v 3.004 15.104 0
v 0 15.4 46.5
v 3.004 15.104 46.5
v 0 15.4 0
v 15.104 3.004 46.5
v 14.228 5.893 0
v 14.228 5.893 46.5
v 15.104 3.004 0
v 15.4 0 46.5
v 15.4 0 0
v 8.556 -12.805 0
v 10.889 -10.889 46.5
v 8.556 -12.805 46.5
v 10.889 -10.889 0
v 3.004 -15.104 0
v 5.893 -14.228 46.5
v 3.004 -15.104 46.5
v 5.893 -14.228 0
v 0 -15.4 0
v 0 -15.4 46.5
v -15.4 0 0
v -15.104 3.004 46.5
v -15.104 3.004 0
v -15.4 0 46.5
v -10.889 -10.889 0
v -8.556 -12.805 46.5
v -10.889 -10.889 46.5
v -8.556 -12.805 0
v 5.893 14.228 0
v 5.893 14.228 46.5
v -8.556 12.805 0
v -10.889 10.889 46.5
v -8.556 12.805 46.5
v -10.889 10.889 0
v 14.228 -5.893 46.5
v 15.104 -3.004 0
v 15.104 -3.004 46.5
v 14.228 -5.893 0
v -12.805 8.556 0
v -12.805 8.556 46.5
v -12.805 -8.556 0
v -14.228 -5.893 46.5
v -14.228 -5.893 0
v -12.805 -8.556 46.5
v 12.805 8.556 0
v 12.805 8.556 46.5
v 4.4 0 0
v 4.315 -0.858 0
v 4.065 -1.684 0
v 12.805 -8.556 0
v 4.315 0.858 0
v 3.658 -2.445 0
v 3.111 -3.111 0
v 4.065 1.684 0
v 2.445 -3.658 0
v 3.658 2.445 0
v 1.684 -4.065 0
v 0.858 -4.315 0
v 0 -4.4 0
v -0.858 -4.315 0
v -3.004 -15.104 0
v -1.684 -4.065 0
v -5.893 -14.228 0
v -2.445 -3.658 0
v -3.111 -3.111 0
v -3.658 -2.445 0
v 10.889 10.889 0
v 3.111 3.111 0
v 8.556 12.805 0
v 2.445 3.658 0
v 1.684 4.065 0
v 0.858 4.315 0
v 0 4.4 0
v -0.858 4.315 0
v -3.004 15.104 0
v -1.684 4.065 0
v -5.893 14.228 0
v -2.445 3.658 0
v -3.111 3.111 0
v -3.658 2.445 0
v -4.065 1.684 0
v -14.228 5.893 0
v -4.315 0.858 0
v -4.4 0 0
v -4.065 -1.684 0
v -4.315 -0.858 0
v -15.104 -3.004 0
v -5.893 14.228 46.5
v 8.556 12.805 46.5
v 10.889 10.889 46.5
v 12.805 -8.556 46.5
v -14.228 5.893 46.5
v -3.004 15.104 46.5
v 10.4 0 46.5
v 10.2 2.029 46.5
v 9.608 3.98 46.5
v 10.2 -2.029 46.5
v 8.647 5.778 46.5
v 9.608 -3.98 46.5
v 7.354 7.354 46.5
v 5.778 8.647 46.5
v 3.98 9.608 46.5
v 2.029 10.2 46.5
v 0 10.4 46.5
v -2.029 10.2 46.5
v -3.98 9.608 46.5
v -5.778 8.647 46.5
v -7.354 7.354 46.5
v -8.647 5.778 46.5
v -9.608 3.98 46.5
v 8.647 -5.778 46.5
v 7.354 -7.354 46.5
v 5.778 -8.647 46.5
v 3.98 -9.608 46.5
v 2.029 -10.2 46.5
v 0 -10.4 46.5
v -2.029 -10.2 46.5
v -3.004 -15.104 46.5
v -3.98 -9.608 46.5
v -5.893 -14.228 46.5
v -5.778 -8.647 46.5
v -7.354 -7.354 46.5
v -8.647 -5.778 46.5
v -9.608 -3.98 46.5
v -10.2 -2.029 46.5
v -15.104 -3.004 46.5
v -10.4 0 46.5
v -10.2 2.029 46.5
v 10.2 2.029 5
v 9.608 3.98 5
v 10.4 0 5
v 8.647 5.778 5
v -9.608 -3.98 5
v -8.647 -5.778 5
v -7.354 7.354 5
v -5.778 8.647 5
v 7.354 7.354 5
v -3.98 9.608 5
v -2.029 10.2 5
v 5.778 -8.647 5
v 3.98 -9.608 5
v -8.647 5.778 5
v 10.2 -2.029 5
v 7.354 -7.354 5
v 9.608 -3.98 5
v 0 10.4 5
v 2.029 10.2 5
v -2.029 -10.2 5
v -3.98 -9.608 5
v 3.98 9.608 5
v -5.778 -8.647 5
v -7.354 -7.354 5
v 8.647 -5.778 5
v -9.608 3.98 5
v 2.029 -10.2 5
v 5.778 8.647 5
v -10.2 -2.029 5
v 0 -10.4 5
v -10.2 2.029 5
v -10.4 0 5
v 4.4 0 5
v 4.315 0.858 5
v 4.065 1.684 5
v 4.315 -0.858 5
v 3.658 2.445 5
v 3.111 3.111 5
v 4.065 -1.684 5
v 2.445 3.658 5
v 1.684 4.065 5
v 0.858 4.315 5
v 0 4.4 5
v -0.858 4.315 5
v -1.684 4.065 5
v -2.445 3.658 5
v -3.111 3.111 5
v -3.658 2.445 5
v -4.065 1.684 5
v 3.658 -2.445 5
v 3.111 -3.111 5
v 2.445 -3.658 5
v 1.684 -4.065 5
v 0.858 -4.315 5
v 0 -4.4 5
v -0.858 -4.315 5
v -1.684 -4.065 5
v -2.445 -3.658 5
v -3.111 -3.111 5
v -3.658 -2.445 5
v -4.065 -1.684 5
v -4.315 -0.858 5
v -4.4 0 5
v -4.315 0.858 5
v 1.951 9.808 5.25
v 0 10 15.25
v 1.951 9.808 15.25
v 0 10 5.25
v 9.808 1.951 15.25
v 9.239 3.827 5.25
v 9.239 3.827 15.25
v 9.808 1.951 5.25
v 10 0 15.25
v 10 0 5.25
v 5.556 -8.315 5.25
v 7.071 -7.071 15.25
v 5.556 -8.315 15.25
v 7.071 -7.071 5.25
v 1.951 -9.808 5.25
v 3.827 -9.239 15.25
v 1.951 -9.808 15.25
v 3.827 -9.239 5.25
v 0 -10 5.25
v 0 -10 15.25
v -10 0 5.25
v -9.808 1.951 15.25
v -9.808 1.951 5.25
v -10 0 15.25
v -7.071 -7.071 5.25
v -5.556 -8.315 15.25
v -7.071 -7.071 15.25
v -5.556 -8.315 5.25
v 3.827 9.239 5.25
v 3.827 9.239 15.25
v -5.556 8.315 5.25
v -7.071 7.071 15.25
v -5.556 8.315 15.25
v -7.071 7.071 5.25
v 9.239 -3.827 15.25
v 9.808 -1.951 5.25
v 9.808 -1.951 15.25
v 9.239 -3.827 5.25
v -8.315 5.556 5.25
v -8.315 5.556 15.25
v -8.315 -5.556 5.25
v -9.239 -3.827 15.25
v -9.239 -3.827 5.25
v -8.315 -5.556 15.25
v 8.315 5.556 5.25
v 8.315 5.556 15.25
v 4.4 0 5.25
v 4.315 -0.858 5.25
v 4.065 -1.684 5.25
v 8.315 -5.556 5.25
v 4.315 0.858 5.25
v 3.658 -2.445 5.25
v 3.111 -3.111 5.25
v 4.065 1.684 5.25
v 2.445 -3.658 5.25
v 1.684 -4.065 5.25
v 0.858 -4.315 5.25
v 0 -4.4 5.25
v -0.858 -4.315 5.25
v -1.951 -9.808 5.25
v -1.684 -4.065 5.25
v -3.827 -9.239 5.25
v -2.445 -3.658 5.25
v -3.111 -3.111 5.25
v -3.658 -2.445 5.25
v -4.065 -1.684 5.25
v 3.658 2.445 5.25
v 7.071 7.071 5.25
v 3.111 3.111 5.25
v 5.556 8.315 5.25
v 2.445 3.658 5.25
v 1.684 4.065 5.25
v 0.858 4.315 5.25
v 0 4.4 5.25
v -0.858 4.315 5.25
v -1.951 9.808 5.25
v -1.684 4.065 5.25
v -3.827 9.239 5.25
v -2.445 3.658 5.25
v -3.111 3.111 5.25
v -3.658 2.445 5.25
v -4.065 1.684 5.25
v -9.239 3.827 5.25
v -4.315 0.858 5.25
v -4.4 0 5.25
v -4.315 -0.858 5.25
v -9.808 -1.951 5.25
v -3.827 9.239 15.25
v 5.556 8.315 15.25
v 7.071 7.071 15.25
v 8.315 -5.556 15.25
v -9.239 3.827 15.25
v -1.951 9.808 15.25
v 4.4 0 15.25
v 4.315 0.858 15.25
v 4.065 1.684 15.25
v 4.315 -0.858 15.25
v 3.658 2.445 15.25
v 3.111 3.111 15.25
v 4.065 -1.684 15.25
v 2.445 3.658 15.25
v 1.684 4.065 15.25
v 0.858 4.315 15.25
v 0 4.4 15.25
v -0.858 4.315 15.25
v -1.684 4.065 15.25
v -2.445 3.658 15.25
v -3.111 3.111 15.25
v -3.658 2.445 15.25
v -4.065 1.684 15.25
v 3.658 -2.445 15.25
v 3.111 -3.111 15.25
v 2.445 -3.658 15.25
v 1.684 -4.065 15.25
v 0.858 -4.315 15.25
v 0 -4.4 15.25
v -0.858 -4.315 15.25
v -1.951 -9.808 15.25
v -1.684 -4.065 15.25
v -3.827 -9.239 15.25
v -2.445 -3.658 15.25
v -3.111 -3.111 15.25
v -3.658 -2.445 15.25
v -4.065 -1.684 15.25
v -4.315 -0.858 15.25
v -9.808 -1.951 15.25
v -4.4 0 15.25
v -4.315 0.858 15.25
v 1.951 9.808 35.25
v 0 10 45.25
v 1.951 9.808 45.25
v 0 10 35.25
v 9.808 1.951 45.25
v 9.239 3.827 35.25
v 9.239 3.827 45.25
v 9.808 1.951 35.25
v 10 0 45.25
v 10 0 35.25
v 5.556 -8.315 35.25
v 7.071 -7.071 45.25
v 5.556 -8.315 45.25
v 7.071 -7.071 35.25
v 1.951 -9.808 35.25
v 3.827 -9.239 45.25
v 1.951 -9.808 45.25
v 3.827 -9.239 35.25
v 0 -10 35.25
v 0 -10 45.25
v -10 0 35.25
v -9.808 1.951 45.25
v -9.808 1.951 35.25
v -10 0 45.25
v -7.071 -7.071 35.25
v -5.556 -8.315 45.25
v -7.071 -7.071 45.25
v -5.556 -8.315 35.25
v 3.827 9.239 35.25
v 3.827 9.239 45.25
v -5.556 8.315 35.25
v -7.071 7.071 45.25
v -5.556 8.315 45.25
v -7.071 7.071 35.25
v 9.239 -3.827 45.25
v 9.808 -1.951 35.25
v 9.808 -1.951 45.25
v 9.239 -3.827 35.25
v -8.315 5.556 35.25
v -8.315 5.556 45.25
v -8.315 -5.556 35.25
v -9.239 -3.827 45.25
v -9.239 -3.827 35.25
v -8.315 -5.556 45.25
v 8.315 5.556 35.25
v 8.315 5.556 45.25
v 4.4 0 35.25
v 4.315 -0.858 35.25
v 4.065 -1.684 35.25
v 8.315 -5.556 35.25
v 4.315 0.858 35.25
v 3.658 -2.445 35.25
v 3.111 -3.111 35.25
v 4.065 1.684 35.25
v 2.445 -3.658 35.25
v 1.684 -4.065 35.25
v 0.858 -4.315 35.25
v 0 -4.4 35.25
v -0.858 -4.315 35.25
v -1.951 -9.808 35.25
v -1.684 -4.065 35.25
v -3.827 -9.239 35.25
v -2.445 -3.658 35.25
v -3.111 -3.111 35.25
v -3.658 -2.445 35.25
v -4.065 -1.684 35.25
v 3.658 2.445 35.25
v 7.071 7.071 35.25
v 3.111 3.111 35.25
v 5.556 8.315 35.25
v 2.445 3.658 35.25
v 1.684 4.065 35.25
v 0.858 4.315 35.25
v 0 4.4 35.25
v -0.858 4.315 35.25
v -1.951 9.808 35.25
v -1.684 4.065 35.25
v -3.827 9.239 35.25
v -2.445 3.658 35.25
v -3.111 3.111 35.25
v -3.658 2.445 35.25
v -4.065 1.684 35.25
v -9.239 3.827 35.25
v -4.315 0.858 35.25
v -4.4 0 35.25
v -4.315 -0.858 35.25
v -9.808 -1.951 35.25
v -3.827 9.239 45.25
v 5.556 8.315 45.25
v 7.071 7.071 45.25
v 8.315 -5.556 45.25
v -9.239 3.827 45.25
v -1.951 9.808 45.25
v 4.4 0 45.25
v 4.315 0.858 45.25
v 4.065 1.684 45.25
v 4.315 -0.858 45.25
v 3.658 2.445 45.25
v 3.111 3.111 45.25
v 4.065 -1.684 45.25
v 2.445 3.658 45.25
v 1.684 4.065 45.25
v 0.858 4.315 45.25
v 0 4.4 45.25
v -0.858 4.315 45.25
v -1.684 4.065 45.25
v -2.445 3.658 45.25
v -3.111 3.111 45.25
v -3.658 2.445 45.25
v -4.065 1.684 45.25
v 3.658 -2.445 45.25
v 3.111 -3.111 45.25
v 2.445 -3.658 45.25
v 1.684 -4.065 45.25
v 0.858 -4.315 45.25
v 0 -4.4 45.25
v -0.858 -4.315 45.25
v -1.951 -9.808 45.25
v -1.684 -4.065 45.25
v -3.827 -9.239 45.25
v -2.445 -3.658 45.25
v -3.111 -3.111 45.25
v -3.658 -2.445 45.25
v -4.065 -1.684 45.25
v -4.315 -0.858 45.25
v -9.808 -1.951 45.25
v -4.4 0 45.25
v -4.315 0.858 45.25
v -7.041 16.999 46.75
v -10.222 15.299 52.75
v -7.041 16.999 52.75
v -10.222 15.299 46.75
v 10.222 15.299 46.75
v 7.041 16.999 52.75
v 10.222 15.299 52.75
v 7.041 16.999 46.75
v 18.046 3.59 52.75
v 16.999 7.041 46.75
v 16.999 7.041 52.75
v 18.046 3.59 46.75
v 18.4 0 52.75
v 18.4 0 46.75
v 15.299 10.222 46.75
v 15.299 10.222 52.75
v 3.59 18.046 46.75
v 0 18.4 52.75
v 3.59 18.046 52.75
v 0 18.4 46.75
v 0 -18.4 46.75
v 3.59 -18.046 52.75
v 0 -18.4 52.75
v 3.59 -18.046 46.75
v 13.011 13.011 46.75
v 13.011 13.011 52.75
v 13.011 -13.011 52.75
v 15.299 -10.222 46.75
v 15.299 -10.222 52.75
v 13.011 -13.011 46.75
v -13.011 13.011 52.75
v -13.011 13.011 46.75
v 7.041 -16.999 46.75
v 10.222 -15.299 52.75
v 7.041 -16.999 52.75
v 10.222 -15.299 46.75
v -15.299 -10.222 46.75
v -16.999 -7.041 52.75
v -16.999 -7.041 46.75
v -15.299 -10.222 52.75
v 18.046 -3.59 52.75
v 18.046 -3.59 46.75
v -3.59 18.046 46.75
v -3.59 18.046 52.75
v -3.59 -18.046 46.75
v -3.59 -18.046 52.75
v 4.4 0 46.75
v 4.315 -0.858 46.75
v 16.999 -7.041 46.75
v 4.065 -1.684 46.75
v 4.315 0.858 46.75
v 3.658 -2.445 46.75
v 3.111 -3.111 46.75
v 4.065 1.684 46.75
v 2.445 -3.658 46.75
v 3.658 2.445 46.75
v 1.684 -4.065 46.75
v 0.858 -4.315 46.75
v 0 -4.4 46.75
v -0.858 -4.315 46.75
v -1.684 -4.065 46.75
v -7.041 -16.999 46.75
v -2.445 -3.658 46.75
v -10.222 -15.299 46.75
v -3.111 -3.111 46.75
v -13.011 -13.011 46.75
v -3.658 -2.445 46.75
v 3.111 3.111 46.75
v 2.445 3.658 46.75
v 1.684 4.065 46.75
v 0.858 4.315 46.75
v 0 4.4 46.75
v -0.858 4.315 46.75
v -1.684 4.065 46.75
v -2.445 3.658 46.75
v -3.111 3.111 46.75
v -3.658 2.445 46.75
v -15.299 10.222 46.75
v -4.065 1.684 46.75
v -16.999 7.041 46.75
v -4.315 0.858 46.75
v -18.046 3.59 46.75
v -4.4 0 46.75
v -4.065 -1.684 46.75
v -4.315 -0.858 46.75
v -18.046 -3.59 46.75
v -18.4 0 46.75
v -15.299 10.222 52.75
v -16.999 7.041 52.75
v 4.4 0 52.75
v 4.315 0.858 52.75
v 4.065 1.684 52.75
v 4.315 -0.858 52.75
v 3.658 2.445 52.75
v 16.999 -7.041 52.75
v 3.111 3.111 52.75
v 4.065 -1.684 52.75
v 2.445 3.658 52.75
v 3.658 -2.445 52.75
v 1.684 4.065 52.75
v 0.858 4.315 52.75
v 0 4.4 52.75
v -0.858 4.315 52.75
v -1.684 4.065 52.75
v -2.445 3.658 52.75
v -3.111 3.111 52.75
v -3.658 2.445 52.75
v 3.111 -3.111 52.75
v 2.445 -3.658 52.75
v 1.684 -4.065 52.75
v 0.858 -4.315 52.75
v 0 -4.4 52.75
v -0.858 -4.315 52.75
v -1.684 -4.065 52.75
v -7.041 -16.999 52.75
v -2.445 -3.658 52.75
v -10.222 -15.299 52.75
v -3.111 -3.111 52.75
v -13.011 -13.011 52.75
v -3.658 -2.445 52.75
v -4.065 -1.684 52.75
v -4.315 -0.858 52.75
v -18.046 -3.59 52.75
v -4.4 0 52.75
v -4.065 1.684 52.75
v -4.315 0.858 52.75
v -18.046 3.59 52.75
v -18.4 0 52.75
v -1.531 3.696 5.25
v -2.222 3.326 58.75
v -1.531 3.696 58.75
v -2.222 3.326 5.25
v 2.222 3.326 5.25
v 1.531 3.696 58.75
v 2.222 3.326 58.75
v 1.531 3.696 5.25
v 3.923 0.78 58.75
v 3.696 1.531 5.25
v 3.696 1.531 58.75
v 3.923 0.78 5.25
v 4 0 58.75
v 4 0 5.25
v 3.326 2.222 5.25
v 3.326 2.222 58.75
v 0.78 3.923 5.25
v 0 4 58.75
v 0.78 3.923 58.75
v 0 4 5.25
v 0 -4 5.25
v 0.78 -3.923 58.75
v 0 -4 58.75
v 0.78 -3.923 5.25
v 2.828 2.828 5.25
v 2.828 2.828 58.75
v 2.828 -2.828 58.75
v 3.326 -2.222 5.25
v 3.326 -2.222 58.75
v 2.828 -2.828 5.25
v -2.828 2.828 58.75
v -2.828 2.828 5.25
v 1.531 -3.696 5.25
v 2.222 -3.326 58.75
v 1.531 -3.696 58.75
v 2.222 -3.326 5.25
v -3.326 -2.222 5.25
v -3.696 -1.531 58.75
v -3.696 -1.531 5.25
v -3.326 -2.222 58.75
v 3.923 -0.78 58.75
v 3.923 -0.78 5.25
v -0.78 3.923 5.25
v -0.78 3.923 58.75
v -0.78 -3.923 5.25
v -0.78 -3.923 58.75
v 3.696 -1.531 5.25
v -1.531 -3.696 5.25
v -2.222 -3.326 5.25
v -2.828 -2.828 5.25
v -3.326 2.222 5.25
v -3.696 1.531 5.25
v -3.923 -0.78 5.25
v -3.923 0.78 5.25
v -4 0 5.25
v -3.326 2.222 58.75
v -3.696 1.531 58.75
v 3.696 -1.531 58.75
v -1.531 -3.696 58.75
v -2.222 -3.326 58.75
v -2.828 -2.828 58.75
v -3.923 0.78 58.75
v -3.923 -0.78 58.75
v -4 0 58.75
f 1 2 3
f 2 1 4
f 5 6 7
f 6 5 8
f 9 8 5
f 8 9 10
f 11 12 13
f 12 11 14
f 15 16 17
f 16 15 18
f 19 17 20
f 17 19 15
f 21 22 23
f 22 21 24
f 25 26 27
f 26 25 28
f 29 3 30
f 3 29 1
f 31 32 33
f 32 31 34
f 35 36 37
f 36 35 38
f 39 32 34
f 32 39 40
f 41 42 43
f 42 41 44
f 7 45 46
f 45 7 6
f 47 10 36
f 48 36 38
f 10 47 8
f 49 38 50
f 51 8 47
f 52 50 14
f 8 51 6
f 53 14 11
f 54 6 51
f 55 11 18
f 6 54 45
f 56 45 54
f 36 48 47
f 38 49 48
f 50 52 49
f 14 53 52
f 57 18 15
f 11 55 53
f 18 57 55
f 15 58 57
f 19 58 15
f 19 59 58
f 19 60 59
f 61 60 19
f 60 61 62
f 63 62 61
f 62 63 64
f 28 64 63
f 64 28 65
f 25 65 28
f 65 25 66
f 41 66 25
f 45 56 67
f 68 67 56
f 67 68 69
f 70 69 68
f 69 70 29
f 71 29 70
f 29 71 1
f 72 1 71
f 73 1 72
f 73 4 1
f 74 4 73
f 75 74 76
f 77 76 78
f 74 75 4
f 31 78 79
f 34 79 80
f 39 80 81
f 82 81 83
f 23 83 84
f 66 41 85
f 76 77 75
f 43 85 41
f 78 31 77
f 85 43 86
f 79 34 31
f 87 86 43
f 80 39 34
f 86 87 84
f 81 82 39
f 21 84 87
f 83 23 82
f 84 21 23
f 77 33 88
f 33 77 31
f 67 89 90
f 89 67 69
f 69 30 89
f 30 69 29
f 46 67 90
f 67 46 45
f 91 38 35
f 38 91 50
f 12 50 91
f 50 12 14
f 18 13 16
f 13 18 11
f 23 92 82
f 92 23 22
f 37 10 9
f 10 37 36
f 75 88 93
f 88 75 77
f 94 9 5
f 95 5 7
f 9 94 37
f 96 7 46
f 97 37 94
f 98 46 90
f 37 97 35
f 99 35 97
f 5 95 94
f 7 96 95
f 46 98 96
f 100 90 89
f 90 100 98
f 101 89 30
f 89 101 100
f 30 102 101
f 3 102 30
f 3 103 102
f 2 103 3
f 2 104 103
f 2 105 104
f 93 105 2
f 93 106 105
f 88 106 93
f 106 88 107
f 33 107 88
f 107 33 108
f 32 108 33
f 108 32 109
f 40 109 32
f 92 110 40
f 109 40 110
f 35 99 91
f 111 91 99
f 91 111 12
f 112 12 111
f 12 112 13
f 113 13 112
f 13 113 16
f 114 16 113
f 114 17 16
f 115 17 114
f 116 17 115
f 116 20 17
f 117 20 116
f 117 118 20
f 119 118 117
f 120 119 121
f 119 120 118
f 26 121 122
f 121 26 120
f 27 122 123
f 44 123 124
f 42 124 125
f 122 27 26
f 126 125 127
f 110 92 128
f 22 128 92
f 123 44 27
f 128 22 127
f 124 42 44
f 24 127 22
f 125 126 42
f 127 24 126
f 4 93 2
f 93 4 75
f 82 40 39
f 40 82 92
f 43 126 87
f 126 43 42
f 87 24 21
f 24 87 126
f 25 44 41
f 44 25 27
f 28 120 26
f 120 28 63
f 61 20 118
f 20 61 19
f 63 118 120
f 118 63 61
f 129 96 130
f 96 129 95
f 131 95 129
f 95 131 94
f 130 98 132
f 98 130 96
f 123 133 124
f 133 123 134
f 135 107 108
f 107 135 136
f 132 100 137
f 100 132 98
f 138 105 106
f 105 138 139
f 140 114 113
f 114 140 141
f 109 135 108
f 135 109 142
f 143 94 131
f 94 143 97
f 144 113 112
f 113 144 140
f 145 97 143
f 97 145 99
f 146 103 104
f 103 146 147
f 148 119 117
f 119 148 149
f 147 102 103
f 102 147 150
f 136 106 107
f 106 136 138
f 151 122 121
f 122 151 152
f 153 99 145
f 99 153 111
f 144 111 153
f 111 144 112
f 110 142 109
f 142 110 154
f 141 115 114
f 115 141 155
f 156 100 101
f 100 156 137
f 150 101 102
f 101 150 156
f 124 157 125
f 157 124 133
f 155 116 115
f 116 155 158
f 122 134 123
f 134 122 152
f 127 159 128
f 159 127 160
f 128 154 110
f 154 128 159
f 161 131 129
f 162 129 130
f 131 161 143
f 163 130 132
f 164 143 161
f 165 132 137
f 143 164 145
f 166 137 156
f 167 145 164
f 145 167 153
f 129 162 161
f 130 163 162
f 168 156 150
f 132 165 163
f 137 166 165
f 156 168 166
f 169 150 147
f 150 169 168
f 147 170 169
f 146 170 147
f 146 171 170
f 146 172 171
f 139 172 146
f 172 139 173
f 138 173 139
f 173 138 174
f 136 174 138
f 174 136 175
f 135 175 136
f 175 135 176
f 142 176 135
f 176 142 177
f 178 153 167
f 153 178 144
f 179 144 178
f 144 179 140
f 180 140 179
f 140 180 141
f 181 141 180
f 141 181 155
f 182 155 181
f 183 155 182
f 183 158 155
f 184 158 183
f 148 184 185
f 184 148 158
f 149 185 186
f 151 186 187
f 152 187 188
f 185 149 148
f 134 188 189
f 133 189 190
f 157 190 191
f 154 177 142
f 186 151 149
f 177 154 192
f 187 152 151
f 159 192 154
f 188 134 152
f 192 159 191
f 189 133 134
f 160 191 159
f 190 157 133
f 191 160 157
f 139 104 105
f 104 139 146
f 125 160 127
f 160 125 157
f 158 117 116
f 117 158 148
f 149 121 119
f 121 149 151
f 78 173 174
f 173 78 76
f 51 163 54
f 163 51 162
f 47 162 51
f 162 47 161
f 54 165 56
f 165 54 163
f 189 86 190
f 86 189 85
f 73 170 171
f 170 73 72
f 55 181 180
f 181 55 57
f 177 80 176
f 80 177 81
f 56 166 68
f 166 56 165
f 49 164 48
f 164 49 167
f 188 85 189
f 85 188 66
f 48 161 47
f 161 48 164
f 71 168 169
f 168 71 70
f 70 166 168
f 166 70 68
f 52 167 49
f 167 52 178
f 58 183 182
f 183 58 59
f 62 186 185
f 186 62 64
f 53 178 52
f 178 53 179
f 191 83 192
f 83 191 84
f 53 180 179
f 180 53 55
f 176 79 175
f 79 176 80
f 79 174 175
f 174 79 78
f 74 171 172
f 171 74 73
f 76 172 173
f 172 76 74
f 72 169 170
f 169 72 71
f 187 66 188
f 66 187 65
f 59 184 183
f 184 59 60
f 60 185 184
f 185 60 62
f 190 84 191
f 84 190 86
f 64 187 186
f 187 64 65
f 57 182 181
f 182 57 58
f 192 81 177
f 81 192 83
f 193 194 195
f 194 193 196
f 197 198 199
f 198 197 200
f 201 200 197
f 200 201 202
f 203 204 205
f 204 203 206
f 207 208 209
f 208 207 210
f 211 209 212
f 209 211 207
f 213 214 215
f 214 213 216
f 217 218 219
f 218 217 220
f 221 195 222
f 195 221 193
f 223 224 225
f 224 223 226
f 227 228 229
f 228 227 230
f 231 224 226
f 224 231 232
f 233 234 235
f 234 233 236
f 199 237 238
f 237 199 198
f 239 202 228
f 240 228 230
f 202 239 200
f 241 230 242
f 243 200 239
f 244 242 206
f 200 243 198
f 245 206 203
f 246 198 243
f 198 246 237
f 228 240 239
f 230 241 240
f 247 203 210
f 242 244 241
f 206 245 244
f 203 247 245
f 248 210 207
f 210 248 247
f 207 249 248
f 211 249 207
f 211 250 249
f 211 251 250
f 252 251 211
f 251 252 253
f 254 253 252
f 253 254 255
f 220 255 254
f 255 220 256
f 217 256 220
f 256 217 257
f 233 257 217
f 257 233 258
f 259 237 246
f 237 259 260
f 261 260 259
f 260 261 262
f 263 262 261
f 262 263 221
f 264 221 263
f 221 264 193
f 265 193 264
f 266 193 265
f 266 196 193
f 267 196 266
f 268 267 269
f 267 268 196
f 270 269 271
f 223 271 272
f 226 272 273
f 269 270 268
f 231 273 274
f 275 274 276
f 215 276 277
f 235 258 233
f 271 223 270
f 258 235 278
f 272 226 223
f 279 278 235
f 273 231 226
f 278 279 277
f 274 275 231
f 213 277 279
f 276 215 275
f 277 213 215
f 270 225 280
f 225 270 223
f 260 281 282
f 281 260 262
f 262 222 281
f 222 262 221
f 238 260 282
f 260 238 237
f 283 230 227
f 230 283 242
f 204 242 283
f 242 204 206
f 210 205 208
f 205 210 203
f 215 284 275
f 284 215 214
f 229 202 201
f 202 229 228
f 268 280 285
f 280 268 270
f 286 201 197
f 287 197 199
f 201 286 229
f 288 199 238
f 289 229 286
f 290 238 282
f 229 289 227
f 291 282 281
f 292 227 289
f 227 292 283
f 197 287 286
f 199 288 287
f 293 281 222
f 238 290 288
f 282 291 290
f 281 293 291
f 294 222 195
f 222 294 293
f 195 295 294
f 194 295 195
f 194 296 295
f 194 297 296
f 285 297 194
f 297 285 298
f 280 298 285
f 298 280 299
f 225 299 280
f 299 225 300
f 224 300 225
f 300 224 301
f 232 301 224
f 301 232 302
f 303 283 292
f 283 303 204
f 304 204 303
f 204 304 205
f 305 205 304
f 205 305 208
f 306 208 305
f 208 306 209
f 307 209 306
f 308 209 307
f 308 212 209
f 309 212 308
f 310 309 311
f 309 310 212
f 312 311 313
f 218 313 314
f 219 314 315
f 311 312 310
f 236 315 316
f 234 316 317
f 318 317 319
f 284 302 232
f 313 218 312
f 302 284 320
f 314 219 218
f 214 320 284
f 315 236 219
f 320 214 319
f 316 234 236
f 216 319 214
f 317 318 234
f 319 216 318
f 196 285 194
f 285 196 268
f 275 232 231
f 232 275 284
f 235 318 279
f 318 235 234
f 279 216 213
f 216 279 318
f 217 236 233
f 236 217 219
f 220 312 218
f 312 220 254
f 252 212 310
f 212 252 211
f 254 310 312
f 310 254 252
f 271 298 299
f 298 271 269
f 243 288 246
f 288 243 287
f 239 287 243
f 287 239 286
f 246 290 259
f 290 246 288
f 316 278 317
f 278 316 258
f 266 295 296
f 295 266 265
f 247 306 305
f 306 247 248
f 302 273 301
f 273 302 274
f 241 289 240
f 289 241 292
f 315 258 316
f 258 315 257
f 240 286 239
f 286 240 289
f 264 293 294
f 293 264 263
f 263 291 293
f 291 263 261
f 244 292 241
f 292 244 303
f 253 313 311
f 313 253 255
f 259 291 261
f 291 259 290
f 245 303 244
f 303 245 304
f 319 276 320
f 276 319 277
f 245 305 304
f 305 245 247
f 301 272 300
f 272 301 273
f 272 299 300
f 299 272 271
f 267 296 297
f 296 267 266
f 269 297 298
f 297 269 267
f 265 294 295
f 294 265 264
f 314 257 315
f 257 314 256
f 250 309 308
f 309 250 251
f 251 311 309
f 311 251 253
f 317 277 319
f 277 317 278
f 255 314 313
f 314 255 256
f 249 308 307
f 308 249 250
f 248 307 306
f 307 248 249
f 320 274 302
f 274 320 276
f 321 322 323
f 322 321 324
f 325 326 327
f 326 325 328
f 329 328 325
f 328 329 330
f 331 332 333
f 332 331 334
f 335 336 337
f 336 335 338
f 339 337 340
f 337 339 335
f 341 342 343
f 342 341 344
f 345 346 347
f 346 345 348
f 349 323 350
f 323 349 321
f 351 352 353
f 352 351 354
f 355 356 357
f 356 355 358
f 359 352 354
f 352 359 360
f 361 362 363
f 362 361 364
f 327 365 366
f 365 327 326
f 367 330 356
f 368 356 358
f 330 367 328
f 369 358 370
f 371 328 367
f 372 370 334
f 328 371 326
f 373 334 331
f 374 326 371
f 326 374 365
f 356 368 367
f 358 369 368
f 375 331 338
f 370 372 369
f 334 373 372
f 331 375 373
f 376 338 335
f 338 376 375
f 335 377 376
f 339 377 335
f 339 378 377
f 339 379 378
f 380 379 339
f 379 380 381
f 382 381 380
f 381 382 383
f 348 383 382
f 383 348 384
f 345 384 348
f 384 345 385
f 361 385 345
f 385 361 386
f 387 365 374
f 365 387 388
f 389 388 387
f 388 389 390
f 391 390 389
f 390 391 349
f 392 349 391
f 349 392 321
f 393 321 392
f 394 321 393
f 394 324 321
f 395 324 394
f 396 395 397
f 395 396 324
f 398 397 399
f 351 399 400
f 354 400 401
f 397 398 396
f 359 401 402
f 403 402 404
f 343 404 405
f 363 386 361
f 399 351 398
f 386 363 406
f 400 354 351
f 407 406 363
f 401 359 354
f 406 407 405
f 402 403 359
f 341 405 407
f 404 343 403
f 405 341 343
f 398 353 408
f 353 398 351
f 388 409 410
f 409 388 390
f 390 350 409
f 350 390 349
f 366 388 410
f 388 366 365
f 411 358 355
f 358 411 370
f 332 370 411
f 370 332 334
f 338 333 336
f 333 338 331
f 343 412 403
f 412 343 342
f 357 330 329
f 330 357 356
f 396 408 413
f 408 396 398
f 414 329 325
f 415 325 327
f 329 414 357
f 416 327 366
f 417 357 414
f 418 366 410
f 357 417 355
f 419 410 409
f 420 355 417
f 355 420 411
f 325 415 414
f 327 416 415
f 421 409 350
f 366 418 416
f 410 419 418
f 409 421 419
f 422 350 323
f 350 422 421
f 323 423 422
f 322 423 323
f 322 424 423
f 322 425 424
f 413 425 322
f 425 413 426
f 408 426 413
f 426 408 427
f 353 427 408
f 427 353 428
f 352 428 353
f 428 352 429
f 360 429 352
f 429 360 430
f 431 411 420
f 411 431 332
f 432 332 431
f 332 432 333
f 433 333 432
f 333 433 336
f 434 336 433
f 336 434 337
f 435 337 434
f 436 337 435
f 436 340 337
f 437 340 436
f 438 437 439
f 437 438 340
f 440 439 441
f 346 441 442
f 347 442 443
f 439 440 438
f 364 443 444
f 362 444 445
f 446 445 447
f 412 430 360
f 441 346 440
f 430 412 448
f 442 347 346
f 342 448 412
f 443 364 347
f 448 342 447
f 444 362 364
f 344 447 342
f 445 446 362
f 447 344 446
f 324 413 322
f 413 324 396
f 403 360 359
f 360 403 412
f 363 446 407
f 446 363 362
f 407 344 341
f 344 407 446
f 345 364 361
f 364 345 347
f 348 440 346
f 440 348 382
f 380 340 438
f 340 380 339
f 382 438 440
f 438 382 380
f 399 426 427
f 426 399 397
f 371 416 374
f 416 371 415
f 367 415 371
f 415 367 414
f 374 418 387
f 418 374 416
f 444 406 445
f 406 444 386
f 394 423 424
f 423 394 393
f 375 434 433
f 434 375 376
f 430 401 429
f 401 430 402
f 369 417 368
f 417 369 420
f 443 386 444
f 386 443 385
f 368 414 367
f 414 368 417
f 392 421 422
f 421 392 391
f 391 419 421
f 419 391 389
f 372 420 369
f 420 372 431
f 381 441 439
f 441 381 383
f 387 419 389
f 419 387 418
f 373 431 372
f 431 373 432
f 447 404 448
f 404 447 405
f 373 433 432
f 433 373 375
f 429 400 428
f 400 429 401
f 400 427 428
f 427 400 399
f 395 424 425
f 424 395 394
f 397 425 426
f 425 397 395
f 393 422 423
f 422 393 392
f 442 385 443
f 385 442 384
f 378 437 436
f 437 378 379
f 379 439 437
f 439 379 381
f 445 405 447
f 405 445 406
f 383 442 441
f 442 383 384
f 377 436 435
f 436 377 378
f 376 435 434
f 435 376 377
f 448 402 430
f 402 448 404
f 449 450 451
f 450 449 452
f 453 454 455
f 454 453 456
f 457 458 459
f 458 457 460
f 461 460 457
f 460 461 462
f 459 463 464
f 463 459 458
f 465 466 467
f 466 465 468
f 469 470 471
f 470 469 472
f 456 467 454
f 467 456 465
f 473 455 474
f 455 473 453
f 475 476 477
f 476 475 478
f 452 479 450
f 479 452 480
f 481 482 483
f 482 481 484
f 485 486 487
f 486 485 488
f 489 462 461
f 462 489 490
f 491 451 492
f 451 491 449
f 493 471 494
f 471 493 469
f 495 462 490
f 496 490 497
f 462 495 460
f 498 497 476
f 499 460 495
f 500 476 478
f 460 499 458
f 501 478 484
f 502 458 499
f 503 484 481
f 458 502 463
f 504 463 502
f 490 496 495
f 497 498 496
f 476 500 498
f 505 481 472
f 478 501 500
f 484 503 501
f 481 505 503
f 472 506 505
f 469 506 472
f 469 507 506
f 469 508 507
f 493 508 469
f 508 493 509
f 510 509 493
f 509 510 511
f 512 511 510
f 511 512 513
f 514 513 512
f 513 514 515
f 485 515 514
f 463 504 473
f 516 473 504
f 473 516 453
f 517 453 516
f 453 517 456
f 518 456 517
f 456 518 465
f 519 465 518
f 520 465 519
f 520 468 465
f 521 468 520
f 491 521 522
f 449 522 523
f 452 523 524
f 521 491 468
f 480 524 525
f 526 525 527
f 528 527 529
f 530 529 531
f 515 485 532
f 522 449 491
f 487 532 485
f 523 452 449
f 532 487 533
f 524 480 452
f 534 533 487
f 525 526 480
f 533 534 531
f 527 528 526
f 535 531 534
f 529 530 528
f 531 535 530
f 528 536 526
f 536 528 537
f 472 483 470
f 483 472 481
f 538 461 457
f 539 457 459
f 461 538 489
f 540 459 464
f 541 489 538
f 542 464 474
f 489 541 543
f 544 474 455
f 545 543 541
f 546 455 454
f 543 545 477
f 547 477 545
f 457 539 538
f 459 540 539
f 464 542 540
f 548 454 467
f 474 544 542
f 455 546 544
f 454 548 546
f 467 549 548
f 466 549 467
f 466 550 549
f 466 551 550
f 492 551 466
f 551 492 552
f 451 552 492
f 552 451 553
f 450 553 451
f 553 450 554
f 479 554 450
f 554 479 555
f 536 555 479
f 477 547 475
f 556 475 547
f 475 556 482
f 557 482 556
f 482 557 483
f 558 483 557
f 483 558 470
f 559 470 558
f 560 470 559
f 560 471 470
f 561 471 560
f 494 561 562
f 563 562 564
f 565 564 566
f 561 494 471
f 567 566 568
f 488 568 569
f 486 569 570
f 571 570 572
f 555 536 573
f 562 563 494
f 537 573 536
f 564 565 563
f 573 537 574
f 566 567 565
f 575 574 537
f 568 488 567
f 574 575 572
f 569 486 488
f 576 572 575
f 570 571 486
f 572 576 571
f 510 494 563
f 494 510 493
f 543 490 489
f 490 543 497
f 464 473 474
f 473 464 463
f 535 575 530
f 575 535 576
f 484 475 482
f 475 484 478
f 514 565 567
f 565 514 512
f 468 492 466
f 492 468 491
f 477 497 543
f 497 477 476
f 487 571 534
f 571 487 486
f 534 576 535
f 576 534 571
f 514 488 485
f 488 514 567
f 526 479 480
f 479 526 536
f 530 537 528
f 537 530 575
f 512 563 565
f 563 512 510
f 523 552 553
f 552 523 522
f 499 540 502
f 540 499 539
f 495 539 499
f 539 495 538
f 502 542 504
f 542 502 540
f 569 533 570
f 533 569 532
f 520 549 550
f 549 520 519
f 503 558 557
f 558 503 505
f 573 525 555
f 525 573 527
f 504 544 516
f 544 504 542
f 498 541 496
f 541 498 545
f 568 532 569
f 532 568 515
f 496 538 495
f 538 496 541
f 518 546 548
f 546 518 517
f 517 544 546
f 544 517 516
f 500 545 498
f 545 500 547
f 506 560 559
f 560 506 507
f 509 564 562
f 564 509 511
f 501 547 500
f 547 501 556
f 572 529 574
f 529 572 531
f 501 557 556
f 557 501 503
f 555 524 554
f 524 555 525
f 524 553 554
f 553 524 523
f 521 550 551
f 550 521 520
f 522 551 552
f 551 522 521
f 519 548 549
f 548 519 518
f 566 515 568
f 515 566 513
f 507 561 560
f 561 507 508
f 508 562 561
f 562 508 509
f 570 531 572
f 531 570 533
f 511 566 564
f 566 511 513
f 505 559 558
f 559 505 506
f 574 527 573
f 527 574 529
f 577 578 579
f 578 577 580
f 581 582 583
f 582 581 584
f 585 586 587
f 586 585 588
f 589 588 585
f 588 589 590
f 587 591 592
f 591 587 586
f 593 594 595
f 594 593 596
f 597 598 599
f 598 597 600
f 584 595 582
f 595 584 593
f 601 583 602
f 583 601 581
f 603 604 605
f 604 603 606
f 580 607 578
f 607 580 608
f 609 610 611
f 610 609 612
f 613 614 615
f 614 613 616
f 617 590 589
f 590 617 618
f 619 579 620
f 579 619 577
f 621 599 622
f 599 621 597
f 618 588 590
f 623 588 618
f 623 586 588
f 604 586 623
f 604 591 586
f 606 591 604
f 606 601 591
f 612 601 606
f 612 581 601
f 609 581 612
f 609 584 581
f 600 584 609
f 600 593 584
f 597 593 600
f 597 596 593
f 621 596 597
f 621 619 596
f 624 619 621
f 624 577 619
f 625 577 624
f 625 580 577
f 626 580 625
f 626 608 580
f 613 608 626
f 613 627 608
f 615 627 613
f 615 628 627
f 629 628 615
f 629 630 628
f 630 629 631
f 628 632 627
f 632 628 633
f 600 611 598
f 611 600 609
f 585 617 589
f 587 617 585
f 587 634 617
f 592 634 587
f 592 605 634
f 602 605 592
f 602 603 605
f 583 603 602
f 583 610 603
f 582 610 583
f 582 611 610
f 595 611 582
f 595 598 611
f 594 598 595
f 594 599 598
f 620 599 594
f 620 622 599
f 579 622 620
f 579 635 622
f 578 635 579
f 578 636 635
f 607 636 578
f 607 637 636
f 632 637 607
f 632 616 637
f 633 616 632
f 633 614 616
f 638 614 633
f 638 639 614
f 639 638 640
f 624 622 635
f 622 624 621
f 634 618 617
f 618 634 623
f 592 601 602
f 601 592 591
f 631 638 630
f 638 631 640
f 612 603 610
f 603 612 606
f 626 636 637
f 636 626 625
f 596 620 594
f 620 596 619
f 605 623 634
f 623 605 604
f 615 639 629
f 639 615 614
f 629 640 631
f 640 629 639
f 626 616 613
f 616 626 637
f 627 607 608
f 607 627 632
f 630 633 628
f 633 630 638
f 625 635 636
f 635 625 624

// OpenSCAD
$fn = 32;

// ------------------------------------------------------------------------
// Shaft station: cup d30.8 x 46.5 mm, shaft d8
// Every part is its own module, assembly() places every instance.
// ------------------------------------------------------------------------

// --- part 1 ---
module housing_cup() {
  difference() {
    cylinder(h = 46.5, d = 30.8);
    translate([0, 0, 5]) cylinder(h = 42.5, d = 20.8);
    translate([0, 0, -1]) cylinder(h = 7, d = 8.8);
  }
}

// --- part 2 ---
module bearing_lower() {
  difference() {
      translate([0, 0, 0]) cylinder(h = 10, d = 20);
      translate([0, 0, -1]) cylinder(h = 12, d = 8.8);
    }
}

// --- part 3 ---
module bearing_upper() {
  difference() {
      translate([0, 0, 0]) cylinder(h = 10, d = 20);
      translate([0, 0, -1]) cylinder(h = 12, d = 8.8);
    }
}

// --- part 4 ---
module station_shaft() {
  translate([0, 0, -26.75]) cylinder(h = 53.5, d = 8);
}

// --- part 5 ---
module station_cover() {
  difference() {
    cylinder(h = 6, d = 36.8);
    translate([0, 0, -1]) cylinder(h = 8, d = 8.8);
  }
}

// --- assembly ---
module assembly() {
  color([0.80, 0.24, 0.20]) translate([0, 0, 0]) rotate([0, 0, 0]) housing_cup();
  color([0.20, 0.45, 0.75]) translate([0, 0, 5.25]) rotate([0, 0, 0]) bearing_lower();
  color([0.25, 0.62, 0.32]) translate([0, 0, 35.25]) rotate([0, 0, 0]) bearing_upper();
  color([0.92, 0.70, 0.18]) translate([0, 0, 32]) rotate([0, 0, 0]) station_shaft();
  color([0.58, 0.35, 0.70]) translate([0, 0, 46.75]) rotate([0, 0, 0]) station_cover();
}

assembly();
